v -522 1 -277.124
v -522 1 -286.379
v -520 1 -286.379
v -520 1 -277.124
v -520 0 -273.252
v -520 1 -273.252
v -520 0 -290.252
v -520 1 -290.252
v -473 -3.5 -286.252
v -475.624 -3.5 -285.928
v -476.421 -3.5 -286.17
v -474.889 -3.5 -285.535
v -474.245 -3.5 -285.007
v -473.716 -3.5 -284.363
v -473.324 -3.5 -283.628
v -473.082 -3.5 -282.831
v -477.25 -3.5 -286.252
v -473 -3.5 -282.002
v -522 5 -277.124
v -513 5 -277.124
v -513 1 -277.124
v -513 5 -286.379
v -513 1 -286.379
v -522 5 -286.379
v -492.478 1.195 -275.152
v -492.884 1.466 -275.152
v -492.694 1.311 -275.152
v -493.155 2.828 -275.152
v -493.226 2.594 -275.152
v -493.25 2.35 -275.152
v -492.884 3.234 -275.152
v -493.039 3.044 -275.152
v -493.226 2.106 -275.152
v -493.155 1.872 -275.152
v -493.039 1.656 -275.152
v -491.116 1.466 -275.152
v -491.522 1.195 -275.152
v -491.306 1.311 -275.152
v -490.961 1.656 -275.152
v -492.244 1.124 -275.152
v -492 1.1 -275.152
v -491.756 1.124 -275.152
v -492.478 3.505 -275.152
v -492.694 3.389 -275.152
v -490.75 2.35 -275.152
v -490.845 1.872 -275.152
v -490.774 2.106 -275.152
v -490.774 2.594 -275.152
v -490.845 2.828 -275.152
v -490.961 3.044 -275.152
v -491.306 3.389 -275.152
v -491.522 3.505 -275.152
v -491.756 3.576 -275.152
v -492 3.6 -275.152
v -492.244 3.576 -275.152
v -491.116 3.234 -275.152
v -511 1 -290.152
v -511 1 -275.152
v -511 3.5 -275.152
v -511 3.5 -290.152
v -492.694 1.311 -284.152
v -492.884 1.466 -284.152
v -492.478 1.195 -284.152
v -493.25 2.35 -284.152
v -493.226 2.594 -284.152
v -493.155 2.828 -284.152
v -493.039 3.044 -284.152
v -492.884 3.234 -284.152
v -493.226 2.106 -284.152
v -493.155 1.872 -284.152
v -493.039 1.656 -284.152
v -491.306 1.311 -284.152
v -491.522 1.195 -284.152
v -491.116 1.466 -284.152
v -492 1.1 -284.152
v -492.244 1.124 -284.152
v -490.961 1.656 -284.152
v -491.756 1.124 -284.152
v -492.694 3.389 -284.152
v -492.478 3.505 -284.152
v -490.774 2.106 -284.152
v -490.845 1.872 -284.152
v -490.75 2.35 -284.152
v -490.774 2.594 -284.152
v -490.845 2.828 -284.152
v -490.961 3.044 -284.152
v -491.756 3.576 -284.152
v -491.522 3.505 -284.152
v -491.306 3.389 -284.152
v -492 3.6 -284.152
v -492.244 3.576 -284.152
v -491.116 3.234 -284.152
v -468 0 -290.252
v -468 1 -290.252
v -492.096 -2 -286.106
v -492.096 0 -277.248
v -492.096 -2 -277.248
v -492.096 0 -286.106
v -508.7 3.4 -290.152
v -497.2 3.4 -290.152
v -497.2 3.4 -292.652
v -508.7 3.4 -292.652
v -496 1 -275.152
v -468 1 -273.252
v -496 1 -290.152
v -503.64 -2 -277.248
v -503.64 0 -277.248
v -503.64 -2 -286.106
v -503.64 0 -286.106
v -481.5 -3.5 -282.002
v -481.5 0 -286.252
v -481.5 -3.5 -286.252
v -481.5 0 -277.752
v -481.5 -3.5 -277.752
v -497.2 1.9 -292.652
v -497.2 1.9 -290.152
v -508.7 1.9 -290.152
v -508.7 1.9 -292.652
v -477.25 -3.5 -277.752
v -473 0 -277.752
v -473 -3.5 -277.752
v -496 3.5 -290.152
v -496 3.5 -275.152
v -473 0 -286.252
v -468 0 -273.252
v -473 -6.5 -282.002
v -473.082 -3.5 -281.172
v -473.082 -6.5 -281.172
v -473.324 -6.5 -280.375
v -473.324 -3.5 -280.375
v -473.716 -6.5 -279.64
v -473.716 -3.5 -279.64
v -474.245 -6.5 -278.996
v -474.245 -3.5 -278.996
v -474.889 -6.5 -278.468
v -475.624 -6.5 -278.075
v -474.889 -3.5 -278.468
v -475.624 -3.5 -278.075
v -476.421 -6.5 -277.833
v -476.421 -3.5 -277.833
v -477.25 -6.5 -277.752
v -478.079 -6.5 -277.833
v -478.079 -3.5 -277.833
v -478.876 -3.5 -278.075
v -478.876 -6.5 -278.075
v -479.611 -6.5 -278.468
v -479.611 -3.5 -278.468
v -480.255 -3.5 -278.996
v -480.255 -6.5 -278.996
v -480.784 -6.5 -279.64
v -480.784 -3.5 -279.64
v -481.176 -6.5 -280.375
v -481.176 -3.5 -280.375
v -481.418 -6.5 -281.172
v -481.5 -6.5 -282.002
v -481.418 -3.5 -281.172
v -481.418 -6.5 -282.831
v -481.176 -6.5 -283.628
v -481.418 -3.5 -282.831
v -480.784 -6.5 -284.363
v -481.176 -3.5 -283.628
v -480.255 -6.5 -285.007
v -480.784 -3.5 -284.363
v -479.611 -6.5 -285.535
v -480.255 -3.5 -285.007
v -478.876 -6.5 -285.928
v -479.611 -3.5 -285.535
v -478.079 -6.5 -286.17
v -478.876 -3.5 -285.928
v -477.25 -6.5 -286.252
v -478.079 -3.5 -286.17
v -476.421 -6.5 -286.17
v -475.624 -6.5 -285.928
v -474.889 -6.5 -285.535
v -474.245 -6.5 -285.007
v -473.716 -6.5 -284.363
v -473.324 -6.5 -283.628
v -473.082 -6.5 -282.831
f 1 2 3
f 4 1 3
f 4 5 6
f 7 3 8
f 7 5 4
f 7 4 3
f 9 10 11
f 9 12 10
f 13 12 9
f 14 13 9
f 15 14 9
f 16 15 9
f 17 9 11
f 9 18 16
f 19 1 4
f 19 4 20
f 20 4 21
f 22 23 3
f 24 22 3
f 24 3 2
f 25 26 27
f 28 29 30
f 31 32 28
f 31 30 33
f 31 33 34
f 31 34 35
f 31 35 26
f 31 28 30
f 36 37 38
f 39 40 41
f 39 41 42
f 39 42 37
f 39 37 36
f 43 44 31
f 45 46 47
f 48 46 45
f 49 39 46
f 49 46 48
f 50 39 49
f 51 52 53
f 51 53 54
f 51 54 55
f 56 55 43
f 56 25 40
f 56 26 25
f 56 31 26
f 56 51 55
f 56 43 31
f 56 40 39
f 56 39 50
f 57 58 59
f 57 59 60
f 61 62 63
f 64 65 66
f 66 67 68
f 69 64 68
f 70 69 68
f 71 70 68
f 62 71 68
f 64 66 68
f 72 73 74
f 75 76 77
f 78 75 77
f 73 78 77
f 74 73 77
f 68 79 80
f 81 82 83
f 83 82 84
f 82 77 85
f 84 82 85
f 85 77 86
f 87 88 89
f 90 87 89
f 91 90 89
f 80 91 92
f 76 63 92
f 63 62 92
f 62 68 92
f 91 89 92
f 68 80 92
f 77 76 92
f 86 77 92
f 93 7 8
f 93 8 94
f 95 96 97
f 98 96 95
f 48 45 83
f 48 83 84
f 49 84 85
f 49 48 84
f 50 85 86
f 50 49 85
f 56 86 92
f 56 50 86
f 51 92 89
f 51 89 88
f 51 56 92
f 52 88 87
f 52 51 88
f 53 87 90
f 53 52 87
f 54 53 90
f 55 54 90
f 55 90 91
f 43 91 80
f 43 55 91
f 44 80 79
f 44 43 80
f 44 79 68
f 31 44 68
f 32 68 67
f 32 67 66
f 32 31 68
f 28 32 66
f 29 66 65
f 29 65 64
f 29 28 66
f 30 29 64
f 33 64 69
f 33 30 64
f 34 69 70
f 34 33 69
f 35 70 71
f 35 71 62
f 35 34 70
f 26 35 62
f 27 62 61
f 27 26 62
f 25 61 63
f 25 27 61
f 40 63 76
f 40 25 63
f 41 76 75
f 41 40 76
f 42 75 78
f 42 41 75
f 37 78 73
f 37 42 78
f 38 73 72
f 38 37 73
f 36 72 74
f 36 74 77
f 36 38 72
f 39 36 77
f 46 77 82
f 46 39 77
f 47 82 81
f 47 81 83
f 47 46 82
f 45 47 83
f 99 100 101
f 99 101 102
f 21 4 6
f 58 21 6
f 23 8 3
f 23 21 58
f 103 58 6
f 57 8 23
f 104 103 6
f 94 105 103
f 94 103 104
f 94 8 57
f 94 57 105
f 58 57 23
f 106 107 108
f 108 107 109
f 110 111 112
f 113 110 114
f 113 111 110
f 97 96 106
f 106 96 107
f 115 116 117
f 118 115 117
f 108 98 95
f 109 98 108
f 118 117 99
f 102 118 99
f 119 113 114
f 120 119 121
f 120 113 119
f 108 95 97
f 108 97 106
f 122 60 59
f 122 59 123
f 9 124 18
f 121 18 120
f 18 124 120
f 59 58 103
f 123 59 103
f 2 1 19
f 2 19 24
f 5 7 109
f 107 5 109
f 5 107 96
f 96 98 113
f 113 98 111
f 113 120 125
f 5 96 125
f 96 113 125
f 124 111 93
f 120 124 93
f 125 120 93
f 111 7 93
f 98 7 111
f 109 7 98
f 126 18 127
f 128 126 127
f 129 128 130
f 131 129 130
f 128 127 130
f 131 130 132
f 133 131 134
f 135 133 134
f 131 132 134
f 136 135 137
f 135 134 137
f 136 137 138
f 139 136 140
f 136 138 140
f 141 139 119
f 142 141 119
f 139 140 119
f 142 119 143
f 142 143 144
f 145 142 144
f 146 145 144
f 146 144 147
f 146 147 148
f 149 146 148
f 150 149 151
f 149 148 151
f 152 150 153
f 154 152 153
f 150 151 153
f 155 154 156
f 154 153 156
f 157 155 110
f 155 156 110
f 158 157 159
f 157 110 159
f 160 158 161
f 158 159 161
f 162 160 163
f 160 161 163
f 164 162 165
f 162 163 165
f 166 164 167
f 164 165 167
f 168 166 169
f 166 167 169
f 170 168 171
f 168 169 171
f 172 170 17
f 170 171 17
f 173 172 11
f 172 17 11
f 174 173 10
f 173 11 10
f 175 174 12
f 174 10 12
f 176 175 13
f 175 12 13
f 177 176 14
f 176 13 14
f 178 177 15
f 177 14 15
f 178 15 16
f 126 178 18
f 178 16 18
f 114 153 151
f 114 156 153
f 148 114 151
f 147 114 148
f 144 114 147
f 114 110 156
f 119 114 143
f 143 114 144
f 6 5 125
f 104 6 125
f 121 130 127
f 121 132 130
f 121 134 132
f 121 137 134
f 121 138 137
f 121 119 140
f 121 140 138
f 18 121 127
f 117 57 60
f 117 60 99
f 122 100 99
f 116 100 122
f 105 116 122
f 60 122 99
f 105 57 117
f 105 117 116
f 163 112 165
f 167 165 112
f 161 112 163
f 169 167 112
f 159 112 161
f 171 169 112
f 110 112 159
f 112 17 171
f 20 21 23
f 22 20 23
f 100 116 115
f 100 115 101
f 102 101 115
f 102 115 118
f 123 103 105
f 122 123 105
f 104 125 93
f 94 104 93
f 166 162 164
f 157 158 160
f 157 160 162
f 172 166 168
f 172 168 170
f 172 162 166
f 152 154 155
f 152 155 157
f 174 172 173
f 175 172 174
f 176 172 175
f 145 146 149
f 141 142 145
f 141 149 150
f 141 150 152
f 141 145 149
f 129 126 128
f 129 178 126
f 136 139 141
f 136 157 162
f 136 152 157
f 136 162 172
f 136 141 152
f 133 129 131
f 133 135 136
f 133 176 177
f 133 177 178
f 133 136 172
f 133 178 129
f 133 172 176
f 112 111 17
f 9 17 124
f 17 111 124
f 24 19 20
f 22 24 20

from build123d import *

# Parameters (mm, degrees)
SKETCH1_W           = 52
SKETCH1_H           = 17
BOSS_EXTRUDE1_DEPTH = 1
SKETCH2_W           = 2
SKETCH2_H           = 9.255511068
SKETCH2_W_2         = 7
BOSS_EXTRUDE2_DEPTH = 4
SKETCH3_W           = 15
SKETCH3_H           = 15
BOSS_EXTRUDE3_DEPTH = 2.5
SKETCH4_W           = 11.5
SKETCH4_H           = 1.5
BOSS_EXTRUDE4_DEPTH = 2.5
SKETCH5_R           = 1.25
BOSS_EXTRUDE5_DEPTH = 9
SKETCH6_W           = 8.5
SKETCH6_H           = 8.5
BOSS_EXTRUDE6_DEPTH = 3.5
SKETCH7_R           = 4.25
BOSS_EXTRUDE7_DEPTH = 3
SKETCH8_W           = 11.544073995
SKETCH8_H           = 8.858488223
BOSS_EXTRUDE8_DEPTH = 2


with BuildPart() as part:
    # Sketch1 → Boss-Extrude1 (new body)
    with BuildSketch(Plane(origin=(0, 0, 0), x_dir=(1, 0, 0), z_dir=(0, 1, 0))):
        with Locations((-494, 281.751572327)):
            Rectangle(SKETCH1_W, SKETCH1_H)
    extrude(amount=BOSS_EXTRUDE1_DEPTH)

    # Sketch2 → Boss-Extrude2 (add)
    with BuildSketch(Plane(origin=(0, 1, 0), x_dir=(1, 0, 0), z_dir=(0, 1, 0))):
        with Locations((-521, 281.751572327)):
            Rectangle(SKETCH2_W, SKETCH2_H)
        with Locations((-516.5, 281.751572327)):
            Rectangle(SKETCH2_W_2, SKETCH2_H)
    extrude(amount=BOSS_EXTRUDE2_DEPTH)

    # Sketch3 → Boss-Extrude3 (add)
    with BuildSketch(Plane(origin=(0, 1, 0), x_dir=(1, 0, 0), z_dir=(0, 1, 0))):
        with Locations((-503.5, 282.651572327)):
            Rectangle(SKETCH3_W, SKETCH3_H)
    extrude(amount=BOSS_EXTRUDE3_DEPTH)

    # Sketch4 → Boss-Extrude4 (add)
    with BuildSketch(Plane(origin=(0, 0, -290.151572327), x_dir=(-1, 0, 0), z_dir=(0, 0, -1))):
        with Locations((502.95, 2.65)):
            Rectangle(SKETCH4_W, SKETCH4_H)
    extrude(amount=BOSS_EXTRUDE4_DEPTH)

    # Sketch6 → Boss-Extrude6 (add)
    with BuildSketch(Plane.XZ):
        with Locations((-477.25, -282.001572327)):
            Rectangle(SKETCH6_W, SKETCH6_H)
    extrude(amount=BOSS_EXTRUDE6_DEPTH)

    # Sketch7 → Boss-Extrude7 (add)
    with BuildSketch(Plane.XZ.offset(3.5)):
        with Locations((-477.25, -282.001572327)):
            Circle(SKETCH7_R)
    extrude(amount=BOSS_EXTRUDE7_DEPTH)

    # Sketch8 → Boss-Extrude8 (add)
    with BuildSketch(Plane(origin=(0, 0, 0), x_dir=(-1, 0, 0), z_dir=(0, -1, 0))):
        with Locations((497.867789367, 281.677075186)):
            Rectangle(SKETCH8_W, SKETCH8_H)
    extrude(amount=BOSS_EXTRUDE8_DEPTH)


with BuildPart() as body_2:
    # Sketch5 → Boss-Extrude5 (new body)
    with BuildSketch(Plane.XY.offset(-275.151572327)):
        with Locations((-492, 2.35)):
            Circle(SKETCH5_R)
    extrude(amount=-BOSS_EXTRUDE5_DEPTH)


solid = Compound([part.part, body_2.part])
